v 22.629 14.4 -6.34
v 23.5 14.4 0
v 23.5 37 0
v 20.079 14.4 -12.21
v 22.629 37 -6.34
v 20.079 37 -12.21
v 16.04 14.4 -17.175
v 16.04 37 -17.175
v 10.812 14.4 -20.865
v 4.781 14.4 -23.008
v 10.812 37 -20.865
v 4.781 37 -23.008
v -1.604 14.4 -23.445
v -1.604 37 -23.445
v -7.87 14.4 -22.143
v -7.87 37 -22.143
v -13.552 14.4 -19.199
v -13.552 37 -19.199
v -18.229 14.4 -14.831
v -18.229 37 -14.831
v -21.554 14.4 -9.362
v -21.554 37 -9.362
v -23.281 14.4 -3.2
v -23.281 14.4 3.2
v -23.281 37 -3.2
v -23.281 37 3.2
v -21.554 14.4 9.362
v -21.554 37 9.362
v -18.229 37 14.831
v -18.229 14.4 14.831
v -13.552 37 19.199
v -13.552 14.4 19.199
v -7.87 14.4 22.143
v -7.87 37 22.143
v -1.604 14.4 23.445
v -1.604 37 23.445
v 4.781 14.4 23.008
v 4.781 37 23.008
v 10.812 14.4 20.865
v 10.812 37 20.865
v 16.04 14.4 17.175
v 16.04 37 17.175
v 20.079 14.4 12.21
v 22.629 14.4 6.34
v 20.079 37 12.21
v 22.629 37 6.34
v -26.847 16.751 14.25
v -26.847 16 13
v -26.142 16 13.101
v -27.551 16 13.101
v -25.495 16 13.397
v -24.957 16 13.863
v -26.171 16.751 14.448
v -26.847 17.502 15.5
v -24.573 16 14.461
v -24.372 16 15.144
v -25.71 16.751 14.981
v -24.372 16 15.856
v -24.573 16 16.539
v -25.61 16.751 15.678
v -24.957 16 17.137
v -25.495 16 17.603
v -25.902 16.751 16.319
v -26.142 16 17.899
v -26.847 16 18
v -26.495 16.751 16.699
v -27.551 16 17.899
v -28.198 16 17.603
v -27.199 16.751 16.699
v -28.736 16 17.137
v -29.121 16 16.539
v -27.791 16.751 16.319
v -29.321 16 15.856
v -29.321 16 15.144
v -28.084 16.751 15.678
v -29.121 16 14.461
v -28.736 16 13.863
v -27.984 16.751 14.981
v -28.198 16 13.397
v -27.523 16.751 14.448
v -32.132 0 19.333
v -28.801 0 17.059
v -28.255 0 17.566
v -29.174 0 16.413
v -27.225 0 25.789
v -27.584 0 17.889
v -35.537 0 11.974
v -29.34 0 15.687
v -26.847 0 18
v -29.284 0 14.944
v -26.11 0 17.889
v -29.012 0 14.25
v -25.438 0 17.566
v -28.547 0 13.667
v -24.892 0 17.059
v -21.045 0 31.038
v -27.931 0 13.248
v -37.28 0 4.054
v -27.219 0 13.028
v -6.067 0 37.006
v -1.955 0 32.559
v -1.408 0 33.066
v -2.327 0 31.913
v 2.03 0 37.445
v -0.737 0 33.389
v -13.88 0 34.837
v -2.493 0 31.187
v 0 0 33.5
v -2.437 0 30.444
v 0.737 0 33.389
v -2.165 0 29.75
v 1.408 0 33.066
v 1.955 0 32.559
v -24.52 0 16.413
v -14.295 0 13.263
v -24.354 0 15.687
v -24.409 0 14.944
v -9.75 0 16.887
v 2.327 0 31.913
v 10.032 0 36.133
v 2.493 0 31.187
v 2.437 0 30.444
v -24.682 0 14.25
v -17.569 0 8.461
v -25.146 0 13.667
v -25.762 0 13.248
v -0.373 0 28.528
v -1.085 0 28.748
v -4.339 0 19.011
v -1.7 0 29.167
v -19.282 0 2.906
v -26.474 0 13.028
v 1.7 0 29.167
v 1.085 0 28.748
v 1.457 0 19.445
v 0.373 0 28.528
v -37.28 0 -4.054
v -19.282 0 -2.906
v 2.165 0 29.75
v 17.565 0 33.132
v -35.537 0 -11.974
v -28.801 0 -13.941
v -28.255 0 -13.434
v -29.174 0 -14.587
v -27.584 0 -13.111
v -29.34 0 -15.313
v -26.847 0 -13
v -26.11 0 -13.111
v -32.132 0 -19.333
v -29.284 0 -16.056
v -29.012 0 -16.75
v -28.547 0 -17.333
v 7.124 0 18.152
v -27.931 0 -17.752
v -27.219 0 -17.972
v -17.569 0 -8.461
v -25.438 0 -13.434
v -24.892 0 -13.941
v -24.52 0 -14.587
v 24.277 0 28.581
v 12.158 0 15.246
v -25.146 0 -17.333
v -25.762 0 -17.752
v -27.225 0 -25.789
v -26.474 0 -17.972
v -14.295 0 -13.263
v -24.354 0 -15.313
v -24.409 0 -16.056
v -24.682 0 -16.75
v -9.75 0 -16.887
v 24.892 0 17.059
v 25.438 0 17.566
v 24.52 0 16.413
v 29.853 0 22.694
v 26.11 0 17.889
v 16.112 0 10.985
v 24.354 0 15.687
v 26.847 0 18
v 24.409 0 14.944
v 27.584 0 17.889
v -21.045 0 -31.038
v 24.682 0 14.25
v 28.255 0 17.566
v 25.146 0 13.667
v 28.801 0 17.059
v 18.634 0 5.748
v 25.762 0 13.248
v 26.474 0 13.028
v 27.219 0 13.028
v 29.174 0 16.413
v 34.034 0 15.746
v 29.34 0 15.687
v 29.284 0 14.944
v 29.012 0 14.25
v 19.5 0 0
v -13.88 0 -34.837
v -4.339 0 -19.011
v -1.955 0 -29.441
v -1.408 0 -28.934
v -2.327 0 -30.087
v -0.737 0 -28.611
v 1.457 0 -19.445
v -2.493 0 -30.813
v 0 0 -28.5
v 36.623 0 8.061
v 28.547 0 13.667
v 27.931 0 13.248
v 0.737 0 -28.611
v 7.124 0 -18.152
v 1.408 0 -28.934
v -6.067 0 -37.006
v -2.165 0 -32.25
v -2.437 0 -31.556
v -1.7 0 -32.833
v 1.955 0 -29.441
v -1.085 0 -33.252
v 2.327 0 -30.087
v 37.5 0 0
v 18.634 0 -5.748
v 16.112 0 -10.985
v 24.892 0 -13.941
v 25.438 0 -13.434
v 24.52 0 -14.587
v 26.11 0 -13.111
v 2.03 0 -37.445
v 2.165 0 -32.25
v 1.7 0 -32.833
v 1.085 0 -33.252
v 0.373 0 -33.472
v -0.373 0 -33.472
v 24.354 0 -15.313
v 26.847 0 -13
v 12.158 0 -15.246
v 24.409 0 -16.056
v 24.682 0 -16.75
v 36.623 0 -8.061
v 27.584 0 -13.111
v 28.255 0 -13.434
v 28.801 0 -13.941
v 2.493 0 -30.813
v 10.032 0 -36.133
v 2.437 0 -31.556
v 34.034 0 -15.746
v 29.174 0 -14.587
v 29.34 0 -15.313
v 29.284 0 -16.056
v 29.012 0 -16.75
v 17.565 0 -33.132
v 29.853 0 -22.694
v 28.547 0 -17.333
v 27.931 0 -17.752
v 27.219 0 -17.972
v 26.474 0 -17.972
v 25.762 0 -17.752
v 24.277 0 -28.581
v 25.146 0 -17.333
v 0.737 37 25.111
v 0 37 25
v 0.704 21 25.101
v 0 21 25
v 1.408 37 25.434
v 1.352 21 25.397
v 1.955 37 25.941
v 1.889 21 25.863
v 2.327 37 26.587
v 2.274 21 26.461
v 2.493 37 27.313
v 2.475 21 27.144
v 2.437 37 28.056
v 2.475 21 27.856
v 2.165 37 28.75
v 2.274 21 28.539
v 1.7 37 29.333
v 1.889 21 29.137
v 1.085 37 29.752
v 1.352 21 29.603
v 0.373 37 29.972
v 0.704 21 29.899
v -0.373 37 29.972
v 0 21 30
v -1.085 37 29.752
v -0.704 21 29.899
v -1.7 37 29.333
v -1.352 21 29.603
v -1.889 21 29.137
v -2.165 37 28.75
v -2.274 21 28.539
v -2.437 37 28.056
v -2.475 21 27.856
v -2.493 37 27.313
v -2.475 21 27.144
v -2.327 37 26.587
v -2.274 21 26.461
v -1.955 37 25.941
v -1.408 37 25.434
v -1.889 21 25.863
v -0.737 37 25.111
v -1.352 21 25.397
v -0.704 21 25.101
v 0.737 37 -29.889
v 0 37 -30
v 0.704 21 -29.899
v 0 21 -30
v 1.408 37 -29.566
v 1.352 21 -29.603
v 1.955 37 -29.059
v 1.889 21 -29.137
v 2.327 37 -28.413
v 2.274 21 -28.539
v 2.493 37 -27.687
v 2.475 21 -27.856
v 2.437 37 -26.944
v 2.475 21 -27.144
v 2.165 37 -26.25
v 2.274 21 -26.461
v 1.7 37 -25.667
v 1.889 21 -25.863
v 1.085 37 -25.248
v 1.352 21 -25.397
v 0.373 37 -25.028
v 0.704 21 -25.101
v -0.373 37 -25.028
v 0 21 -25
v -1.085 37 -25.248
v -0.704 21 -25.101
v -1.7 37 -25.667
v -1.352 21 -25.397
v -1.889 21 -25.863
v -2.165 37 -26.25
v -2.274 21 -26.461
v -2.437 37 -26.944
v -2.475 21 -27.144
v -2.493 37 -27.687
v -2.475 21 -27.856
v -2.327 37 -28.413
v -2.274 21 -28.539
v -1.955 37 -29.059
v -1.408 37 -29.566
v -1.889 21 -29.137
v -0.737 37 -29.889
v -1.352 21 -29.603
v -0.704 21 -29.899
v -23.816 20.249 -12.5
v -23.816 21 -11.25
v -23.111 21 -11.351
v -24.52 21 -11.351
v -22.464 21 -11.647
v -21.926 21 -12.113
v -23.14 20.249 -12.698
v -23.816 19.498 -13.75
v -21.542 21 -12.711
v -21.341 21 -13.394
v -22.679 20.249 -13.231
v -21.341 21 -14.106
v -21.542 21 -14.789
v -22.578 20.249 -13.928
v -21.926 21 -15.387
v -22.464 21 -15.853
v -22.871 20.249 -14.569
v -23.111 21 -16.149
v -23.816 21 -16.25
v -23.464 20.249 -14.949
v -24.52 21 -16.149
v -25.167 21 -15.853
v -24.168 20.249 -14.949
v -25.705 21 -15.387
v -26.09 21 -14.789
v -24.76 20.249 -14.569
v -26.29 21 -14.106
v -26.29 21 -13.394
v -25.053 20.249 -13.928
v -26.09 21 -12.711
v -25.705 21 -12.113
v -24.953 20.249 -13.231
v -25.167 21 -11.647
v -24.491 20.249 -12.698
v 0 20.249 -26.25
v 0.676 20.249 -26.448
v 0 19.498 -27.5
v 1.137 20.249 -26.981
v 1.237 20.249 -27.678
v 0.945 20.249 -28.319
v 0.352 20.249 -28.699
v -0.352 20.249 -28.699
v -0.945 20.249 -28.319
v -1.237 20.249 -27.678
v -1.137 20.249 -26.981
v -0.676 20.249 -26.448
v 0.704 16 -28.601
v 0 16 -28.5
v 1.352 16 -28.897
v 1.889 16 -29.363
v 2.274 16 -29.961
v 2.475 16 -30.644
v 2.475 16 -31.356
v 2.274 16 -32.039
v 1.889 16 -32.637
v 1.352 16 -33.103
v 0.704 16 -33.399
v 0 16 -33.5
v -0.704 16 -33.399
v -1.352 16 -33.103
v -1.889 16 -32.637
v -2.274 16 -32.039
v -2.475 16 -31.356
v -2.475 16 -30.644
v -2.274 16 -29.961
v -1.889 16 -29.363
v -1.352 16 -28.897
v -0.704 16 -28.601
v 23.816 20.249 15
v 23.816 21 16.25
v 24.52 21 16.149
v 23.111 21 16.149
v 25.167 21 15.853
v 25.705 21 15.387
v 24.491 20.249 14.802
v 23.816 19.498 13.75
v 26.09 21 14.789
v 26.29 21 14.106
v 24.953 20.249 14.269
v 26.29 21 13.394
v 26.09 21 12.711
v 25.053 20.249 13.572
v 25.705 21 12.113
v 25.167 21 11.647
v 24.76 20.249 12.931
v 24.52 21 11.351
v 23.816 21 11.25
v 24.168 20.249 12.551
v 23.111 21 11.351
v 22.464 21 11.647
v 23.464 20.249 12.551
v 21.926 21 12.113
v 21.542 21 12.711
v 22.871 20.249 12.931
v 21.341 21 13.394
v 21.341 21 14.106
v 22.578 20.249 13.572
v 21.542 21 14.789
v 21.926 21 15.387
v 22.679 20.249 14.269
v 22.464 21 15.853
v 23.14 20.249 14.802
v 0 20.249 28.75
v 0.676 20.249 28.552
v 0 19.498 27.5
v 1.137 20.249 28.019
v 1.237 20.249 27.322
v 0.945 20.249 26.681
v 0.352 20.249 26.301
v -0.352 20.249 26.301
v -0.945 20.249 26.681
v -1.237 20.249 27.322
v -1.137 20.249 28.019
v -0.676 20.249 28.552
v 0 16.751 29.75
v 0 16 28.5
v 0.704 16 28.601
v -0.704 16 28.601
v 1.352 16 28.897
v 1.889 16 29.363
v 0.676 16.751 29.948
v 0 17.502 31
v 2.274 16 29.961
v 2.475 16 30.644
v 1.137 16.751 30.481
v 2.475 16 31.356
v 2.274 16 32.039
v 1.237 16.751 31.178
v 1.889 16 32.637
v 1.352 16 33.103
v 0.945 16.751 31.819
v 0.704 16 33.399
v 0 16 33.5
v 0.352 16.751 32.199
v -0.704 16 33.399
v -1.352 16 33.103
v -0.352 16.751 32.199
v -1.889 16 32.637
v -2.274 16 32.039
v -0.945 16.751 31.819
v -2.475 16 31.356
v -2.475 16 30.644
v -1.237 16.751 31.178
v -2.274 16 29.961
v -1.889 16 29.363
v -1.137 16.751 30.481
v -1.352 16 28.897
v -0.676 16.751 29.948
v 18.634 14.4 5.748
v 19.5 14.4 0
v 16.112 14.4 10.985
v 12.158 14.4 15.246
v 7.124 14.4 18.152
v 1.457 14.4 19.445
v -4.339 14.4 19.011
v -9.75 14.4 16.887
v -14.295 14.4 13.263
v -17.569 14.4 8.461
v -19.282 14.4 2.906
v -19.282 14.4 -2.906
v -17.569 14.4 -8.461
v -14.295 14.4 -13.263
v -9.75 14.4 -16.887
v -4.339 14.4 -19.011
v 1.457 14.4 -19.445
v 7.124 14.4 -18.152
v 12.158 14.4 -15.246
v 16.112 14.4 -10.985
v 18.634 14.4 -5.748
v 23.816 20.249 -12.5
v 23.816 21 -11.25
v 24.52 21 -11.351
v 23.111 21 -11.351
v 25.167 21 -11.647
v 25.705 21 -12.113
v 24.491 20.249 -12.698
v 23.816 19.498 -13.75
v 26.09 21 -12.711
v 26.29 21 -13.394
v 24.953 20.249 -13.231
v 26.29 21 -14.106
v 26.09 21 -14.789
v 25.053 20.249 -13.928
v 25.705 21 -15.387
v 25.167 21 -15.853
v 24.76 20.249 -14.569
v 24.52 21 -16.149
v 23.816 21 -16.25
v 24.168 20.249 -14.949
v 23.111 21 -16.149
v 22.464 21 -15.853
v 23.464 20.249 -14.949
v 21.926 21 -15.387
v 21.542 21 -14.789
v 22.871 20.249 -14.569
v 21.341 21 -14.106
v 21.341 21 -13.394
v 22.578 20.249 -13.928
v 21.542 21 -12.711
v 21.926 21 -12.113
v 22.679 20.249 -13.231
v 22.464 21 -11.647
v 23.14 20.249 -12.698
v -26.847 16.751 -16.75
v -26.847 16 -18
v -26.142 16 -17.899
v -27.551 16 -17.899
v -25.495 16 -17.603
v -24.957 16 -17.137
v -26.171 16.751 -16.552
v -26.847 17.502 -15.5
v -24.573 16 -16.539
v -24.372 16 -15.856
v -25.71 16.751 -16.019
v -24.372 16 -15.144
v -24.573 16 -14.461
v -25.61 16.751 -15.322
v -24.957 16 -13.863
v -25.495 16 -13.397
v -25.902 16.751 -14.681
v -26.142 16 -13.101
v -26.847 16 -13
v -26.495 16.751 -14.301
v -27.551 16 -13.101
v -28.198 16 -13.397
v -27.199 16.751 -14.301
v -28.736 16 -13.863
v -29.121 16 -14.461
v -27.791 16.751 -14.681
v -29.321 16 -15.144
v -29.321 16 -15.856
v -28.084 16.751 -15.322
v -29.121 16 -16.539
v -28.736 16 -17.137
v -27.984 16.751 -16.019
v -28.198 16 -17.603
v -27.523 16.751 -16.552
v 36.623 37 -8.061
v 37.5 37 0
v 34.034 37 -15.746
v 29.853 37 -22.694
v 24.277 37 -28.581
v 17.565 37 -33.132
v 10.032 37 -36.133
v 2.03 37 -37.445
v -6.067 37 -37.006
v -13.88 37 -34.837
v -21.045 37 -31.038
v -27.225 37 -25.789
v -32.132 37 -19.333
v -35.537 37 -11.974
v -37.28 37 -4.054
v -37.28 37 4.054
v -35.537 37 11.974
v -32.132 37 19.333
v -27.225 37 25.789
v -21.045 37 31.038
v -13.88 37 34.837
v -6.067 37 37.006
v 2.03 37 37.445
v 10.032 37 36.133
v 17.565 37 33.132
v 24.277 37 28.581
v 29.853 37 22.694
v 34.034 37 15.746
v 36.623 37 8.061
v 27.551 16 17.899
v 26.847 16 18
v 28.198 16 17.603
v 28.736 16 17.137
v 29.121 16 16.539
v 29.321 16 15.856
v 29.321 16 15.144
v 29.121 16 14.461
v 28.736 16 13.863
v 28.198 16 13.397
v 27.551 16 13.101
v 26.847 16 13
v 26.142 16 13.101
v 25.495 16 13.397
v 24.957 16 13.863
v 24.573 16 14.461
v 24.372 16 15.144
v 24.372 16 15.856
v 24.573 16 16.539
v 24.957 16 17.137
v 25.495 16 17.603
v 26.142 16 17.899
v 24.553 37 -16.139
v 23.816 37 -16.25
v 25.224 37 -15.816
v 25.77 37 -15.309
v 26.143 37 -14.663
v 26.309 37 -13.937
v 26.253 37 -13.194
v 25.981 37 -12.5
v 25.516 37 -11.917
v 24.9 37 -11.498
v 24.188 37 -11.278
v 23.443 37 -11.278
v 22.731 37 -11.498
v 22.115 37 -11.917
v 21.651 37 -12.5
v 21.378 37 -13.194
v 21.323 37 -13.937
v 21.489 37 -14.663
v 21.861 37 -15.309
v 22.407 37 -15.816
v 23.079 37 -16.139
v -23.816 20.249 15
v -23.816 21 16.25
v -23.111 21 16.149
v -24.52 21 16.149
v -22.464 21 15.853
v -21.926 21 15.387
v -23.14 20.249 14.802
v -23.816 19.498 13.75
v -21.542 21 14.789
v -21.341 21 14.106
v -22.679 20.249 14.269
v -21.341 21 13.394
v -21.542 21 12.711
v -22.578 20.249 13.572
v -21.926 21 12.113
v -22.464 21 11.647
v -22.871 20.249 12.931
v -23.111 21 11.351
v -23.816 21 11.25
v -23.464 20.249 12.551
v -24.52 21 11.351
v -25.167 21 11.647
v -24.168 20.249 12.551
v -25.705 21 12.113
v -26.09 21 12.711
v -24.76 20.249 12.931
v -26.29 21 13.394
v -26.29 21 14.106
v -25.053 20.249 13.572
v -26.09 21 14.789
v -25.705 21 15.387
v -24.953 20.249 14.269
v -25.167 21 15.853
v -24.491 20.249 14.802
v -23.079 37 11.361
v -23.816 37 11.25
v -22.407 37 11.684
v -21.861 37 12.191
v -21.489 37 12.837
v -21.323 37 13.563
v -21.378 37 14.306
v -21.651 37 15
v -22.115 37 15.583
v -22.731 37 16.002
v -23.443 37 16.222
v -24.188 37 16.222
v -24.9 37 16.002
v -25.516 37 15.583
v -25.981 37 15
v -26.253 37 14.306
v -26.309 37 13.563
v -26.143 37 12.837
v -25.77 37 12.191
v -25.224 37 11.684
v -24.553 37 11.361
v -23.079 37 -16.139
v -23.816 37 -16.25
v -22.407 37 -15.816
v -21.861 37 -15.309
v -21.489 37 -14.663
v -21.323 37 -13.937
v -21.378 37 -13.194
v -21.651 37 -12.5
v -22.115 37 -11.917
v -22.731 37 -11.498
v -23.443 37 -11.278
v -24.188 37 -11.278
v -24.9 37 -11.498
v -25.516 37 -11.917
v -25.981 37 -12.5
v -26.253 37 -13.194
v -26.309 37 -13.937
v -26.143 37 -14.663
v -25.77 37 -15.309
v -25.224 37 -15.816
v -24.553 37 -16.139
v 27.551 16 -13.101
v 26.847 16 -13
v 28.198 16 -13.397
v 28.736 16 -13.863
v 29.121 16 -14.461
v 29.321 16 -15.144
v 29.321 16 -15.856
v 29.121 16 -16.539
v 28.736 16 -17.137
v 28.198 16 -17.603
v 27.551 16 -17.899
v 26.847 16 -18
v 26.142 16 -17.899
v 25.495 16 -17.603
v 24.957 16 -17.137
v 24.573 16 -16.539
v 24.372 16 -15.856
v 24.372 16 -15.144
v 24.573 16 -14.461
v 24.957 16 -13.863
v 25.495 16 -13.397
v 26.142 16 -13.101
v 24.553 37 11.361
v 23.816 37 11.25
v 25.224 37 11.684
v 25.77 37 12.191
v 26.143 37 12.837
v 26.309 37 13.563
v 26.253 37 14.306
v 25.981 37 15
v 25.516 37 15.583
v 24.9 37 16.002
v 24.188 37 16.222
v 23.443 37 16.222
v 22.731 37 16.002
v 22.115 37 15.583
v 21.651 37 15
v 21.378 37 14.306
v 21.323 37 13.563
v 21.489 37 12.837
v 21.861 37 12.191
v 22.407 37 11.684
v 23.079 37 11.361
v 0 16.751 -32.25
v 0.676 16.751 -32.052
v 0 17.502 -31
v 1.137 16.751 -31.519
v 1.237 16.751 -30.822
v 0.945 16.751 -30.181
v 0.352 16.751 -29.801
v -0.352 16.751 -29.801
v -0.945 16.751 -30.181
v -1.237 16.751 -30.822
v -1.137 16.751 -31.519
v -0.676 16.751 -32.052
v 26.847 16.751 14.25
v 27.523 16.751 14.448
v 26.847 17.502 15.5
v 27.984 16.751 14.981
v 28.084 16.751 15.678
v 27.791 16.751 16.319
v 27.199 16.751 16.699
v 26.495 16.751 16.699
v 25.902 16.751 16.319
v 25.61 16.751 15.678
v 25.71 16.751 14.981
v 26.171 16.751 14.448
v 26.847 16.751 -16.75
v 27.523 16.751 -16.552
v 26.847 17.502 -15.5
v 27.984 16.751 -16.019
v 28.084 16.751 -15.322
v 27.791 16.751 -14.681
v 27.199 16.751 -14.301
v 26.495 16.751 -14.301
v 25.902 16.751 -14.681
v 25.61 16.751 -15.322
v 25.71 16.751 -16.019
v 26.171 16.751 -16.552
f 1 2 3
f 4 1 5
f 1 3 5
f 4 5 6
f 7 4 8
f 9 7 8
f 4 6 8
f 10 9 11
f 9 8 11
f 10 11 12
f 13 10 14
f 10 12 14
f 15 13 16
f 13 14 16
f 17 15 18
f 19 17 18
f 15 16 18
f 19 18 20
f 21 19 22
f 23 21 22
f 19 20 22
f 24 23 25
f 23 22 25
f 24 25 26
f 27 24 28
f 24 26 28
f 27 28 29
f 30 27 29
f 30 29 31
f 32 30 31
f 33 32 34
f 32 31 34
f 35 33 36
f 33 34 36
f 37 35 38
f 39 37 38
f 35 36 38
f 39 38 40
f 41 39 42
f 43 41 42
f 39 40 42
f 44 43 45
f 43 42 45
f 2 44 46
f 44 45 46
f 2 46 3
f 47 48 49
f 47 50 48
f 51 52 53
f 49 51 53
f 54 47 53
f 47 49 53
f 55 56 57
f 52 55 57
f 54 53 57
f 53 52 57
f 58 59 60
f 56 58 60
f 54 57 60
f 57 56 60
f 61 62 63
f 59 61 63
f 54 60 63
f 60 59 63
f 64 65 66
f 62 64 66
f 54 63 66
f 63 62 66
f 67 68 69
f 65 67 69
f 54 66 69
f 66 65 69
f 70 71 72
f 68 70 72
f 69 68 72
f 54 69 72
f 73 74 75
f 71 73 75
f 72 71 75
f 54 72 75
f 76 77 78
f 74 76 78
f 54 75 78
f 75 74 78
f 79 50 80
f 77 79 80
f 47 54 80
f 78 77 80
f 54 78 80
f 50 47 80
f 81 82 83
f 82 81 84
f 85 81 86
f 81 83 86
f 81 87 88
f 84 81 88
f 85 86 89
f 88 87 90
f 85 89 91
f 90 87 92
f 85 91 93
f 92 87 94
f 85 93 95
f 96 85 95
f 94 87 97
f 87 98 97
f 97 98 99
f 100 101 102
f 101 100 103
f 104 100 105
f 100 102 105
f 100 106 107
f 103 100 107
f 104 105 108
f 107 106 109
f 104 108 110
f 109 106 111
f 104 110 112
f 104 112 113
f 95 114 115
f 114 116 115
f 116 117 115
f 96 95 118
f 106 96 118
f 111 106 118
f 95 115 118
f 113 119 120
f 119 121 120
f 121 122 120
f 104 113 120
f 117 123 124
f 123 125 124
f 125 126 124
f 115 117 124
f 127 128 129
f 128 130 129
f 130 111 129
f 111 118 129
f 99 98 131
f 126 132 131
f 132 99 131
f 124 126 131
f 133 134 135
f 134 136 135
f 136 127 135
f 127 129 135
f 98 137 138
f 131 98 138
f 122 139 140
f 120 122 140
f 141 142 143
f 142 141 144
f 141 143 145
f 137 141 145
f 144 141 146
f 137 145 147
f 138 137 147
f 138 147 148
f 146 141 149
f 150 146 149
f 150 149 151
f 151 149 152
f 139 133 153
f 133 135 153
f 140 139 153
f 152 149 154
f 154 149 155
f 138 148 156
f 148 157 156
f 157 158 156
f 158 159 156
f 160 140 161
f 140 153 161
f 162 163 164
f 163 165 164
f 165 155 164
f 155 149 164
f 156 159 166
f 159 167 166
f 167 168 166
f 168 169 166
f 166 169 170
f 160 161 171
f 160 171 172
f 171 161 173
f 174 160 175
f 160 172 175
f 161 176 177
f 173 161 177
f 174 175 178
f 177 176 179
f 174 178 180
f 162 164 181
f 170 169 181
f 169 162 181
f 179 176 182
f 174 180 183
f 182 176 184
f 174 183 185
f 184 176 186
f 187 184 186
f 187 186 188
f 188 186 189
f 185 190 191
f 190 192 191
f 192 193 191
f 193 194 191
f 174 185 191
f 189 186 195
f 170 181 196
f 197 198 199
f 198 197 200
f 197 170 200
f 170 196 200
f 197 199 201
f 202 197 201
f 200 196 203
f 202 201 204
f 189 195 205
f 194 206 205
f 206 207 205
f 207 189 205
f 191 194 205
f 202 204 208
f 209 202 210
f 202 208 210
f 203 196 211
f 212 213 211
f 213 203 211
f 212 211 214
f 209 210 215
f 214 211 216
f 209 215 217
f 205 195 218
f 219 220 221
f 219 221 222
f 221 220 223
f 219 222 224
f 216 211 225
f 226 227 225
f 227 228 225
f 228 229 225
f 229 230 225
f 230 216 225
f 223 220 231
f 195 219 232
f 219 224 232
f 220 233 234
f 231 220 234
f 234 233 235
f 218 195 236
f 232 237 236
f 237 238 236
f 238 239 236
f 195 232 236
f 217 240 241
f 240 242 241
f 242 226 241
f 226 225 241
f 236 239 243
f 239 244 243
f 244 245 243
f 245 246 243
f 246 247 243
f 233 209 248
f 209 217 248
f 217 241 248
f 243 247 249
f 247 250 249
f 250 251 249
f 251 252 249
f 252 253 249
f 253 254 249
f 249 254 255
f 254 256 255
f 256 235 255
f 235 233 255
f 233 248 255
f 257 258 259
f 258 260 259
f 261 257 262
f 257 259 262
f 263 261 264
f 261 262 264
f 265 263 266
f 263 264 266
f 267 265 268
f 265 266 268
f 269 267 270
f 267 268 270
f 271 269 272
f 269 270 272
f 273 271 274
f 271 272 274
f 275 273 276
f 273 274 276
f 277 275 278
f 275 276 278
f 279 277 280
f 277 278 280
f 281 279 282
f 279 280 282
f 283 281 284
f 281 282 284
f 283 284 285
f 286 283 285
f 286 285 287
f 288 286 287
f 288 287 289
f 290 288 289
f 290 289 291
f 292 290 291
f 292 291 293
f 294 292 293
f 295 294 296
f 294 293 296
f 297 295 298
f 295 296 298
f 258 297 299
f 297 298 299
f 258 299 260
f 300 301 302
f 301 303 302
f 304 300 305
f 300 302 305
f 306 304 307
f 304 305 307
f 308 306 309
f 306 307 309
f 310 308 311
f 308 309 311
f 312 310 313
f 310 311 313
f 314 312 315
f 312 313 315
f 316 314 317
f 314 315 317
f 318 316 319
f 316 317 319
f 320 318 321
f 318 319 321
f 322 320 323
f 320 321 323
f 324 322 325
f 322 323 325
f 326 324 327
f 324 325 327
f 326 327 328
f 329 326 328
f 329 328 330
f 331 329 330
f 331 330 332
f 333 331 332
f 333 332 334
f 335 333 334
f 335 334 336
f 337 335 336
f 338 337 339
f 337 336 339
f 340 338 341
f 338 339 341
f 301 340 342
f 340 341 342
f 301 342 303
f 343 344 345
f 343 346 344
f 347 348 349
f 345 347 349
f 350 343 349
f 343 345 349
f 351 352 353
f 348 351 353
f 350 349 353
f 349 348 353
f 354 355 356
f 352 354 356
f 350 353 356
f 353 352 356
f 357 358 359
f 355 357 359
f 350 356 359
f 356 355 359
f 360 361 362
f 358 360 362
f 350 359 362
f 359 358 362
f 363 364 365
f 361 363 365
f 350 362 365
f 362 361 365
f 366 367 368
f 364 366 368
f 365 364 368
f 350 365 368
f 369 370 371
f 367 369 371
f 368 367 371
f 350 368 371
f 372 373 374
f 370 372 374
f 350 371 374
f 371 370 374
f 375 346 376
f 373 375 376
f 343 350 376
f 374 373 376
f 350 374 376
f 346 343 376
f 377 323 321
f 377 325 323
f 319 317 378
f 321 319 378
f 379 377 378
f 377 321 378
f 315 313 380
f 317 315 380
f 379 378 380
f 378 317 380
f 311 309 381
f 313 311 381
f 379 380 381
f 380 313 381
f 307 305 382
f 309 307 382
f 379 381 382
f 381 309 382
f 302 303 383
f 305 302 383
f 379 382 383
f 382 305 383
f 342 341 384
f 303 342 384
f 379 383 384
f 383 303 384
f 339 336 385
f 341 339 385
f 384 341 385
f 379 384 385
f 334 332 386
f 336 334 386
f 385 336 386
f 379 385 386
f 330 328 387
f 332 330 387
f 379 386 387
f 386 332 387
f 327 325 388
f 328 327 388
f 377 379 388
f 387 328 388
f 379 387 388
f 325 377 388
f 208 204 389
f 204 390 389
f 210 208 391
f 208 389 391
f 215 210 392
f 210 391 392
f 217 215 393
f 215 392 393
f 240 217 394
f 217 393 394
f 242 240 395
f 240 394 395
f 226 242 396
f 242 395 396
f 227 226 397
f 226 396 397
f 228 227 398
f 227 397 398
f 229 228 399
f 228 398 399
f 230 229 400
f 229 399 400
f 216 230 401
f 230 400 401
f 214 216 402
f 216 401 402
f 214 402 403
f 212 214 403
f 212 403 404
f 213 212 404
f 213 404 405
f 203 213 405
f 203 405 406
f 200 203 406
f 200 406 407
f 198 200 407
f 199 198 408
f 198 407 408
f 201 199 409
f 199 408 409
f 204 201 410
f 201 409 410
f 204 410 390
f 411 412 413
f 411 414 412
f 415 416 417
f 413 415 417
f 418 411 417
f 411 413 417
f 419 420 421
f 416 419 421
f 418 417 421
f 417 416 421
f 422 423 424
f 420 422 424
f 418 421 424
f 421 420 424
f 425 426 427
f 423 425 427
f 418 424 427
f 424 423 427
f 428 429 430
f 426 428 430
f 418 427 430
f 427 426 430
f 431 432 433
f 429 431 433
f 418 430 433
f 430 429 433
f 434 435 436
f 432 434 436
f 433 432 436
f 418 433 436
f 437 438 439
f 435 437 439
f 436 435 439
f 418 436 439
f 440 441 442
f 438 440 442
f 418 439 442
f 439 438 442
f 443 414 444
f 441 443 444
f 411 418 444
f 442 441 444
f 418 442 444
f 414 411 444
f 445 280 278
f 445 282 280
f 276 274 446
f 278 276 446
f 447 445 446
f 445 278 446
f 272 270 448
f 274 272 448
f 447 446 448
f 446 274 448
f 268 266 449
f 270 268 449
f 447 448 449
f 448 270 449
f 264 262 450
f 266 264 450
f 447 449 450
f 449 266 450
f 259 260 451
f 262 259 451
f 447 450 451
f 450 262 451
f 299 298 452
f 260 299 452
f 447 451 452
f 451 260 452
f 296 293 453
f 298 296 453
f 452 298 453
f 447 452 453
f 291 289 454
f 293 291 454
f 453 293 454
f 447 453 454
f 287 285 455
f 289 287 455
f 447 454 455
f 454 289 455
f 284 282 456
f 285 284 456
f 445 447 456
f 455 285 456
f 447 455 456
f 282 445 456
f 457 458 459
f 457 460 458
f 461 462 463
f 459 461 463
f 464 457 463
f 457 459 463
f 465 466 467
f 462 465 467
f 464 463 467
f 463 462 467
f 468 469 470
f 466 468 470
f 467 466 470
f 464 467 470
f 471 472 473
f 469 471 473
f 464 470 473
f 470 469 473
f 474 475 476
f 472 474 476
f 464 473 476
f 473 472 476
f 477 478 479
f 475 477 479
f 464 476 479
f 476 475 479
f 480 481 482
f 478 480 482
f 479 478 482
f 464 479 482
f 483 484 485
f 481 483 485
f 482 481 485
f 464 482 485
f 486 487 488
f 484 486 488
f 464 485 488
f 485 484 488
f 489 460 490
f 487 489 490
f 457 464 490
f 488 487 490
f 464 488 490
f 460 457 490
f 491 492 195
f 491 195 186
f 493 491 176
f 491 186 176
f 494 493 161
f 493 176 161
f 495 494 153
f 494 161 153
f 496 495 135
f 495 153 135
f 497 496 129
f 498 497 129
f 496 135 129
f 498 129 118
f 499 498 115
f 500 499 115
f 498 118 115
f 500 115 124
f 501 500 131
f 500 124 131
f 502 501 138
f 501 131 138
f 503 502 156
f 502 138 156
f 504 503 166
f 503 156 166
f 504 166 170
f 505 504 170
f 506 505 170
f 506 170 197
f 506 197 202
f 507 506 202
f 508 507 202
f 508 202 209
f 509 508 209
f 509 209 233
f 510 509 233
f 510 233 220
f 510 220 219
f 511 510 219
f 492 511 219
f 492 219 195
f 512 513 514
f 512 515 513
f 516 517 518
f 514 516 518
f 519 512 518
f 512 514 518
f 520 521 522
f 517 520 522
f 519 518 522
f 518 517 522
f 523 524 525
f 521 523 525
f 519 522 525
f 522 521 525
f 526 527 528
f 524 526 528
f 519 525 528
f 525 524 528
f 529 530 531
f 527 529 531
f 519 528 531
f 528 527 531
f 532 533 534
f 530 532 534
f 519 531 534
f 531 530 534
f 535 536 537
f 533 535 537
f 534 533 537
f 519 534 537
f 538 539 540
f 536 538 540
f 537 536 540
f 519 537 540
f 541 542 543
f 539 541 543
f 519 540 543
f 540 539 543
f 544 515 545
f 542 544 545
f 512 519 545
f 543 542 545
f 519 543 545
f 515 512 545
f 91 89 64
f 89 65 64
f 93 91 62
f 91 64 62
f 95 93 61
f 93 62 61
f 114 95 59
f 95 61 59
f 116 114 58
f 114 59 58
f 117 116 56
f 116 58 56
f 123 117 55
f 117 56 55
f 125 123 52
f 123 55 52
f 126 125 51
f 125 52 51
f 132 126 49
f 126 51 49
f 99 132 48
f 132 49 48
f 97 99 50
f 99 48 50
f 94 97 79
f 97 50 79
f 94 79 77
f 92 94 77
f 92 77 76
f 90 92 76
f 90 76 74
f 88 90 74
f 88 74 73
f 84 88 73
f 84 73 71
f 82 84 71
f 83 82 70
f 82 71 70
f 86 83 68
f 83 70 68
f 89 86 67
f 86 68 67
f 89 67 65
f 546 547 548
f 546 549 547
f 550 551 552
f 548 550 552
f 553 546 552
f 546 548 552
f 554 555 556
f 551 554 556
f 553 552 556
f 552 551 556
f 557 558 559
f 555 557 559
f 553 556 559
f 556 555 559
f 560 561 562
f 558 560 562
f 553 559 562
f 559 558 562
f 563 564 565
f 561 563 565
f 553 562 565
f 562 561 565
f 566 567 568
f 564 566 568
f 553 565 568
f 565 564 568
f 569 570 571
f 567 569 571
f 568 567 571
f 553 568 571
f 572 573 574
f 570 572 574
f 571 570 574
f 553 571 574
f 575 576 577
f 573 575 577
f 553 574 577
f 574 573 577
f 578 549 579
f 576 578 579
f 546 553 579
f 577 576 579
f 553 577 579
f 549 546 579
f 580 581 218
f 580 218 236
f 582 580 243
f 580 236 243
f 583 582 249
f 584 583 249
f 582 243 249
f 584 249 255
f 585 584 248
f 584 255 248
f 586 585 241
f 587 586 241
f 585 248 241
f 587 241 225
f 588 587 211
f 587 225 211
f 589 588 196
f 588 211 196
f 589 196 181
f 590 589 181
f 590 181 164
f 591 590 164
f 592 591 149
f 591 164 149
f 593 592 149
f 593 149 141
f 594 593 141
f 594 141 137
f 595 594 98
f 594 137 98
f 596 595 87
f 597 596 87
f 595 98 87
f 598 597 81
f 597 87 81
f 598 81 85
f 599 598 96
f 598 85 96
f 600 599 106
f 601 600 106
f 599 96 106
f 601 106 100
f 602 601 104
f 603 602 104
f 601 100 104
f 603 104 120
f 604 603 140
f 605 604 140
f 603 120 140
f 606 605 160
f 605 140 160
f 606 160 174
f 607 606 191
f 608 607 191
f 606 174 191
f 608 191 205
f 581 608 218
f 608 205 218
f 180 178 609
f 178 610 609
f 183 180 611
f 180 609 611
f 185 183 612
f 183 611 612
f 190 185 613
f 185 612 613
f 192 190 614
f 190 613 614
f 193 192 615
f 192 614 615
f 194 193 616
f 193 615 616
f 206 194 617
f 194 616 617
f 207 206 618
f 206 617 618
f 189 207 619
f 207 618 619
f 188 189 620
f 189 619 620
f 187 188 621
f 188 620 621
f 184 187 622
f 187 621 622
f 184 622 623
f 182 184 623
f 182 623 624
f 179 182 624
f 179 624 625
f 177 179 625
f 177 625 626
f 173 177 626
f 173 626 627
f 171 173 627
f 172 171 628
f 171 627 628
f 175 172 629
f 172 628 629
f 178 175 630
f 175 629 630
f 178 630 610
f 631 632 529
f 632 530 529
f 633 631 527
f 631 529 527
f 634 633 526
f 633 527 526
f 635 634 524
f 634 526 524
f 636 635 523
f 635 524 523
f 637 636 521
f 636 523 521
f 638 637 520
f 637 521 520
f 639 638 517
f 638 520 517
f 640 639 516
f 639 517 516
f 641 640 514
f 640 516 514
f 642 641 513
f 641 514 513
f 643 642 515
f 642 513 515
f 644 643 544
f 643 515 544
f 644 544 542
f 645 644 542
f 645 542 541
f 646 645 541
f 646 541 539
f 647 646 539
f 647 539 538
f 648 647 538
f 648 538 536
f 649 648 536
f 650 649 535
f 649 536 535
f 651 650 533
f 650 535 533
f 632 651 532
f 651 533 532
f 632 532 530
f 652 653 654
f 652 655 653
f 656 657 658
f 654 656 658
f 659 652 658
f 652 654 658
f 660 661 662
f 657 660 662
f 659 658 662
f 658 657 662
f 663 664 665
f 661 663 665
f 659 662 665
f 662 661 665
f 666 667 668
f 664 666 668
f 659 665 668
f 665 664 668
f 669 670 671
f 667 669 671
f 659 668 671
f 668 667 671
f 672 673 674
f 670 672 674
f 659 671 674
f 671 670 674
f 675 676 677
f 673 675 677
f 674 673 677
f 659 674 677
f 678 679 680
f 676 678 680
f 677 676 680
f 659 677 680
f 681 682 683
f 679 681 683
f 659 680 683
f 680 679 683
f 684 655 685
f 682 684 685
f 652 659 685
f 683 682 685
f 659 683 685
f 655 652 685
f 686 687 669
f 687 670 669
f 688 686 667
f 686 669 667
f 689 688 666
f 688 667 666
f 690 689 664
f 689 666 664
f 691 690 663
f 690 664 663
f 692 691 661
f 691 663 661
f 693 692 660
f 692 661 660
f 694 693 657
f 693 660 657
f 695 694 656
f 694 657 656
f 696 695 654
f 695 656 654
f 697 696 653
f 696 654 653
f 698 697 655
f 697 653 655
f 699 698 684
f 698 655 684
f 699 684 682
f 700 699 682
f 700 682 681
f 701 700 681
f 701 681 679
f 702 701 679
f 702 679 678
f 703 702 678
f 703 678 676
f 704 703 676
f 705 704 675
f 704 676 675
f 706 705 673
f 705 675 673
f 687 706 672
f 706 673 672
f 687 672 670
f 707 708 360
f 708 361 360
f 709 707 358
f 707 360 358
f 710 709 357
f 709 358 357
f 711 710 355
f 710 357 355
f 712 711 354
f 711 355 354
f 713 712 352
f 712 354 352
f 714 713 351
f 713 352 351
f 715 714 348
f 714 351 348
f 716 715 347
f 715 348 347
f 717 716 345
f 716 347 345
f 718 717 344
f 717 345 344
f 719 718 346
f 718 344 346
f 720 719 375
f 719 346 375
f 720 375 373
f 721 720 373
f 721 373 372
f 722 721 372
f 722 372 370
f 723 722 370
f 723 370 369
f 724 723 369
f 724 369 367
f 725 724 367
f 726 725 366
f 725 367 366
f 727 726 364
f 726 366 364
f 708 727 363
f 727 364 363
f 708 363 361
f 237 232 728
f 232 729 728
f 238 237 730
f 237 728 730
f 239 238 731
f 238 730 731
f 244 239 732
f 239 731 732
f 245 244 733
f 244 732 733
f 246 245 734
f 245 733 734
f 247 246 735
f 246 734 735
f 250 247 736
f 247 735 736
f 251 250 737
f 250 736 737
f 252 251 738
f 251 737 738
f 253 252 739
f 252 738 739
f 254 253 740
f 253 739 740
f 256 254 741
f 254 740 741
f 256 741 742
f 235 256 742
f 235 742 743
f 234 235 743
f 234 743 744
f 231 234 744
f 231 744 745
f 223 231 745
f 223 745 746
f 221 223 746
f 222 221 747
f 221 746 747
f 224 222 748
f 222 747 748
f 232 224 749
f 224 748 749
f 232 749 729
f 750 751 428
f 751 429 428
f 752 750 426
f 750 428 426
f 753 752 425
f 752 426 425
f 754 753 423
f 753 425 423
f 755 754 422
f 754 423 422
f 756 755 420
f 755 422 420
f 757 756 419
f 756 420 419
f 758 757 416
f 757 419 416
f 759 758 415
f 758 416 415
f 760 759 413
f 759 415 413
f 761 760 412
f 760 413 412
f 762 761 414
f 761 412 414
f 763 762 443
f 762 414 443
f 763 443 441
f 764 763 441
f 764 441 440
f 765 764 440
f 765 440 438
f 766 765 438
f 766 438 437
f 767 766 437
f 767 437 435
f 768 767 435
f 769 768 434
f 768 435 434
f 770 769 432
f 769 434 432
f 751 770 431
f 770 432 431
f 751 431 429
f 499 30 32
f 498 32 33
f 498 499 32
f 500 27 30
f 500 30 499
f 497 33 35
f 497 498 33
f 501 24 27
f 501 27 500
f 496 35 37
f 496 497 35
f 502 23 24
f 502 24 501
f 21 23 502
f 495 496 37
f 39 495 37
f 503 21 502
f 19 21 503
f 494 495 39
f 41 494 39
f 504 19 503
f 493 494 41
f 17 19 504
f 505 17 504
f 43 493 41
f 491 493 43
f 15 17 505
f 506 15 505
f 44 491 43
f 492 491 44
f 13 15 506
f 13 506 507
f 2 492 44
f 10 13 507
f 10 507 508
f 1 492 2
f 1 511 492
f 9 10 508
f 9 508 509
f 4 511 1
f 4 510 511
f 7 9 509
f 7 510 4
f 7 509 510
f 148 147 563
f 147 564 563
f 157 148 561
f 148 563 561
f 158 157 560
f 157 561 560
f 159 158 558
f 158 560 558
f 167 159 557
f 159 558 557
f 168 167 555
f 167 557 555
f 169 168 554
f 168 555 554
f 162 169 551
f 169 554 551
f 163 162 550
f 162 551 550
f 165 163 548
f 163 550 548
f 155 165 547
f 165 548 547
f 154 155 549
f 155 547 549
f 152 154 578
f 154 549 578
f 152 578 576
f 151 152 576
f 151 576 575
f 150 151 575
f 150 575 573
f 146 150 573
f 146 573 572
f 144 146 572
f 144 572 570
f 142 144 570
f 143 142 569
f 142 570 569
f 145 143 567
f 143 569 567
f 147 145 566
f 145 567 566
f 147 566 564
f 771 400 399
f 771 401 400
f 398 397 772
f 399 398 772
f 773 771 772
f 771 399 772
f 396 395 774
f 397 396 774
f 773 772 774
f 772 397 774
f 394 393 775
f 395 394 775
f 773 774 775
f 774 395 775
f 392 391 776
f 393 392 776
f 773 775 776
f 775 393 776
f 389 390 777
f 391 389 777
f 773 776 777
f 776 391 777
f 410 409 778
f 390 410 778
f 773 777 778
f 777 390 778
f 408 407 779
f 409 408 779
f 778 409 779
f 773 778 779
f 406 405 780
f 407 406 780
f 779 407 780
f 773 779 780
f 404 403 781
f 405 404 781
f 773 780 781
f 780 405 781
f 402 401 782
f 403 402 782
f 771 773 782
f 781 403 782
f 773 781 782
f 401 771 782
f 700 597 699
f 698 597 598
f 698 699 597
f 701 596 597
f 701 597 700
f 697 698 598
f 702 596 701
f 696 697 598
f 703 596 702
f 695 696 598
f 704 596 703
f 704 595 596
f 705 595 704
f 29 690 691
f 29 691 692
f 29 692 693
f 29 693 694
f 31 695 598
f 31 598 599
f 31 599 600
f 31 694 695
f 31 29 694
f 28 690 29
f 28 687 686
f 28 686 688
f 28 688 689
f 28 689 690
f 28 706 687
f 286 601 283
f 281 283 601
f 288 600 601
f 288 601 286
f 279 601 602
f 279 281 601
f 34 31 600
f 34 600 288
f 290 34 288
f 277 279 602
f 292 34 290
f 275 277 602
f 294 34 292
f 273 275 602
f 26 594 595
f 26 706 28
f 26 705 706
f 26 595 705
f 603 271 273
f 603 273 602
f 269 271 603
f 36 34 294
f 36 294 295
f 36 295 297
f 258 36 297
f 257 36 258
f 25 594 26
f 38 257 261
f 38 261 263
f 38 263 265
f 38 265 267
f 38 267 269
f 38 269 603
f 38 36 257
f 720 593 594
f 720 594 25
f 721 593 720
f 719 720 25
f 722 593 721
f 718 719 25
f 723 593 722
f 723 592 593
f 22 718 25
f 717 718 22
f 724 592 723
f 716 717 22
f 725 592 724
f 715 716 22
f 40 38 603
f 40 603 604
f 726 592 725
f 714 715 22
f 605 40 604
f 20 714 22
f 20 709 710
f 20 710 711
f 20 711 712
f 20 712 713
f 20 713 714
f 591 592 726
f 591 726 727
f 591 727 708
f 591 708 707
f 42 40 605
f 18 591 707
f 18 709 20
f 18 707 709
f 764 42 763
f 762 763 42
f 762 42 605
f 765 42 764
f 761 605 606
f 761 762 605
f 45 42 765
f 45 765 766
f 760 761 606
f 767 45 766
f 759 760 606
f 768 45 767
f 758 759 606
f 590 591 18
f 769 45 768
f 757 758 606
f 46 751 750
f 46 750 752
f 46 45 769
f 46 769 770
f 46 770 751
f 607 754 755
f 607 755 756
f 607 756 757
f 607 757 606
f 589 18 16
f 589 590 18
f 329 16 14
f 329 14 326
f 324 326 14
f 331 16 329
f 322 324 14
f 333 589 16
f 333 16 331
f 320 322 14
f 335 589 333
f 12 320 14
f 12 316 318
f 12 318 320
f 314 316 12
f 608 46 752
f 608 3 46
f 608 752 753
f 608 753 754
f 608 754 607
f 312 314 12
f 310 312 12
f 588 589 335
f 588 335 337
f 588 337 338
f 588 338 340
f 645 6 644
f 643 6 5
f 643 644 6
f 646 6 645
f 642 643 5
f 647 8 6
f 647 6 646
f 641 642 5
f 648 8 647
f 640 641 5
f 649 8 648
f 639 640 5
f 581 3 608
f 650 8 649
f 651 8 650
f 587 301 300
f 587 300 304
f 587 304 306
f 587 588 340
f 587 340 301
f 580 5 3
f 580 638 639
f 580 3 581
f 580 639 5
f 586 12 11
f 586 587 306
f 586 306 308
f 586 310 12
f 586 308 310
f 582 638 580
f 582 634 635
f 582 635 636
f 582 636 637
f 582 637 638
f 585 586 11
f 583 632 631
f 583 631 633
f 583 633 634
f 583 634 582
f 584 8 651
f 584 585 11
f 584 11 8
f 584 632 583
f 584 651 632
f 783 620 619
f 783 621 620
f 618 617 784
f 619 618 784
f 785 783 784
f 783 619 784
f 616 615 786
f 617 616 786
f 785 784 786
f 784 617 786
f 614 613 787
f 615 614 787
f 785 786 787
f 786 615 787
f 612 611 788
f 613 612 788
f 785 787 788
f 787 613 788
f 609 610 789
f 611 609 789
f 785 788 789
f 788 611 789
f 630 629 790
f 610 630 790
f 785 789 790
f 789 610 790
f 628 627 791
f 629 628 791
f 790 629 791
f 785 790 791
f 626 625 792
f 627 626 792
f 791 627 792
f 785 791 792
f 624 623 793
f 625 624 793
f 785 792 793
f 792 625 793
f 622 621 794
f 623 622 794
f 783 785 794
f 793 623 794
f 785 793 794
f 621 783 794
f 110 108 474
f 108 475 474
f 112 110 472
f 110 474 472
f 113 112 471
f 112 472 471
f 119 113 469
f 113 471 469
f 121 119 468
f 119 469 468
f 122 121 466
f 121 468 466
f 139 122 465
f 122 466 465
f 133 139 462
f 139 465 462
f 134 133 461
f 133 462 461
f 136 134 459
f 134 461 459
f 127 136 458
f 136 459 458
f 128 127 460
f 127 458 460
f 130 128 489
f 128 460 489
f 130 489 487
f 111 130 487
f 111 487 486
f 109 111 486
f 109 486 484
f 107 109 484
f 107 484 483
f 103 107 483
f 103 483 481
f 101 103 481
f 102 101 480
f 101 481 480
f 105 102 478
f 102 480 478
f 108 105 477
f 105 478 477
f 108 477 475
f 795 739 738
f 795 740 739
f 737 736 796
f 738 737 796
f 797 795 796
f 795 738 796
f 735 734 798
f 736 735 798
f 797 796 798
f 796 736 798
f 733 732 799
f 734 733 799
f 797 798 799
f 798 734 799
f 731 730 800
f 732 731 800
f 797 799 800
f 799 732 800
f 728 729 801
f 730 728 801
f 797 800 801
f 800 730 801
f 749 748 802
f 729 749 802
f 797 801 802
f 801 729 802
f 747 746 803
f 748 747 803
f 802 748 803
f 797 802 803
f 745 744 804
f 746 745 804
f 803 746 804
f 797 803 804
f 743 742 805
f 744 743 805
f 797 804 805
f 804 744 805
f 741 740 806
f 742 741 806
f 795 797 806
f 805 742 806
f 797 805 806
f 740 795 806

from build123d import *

# Parameters (mm, degrees)
SKETCH1_R                       = 37.5
BOSS_EXTRUDE1_DEPTH             = 37
SKETCH2_R                       = 23.5
CUT_EXTRUDE1_DEPTH              = 22.6
SKETCH3_R                       = 19.5
CUT_EXTRUDE2_DEPTH              = 38
M6X1_0_TAPPED_HOLE1_D           = 5
M6X1_0_TAPPED_HOLE1_DEPTH       = 16
M6X1_0_TAPPED_HOLE1_TIP         = 1.502151548
TAP_DRILL_FOR_M6X1_0_TAP1_D     = 5
TAP_DRILL_FOR_M6X1_0_TAP1_DEPTH = 16
TAP_DRILL_FOR_M6X1_0_TAP1_TIP   = 1.502151548


with BuildPart() as part:
    # Sketch1 → Boss-Extrude1 (new body)
    with BuildSketch(Plane(origin=(0, 0, 0), x_dir=(1, 0, 0), z_dir=(0, 1, 0))):
        Circle(SKETCH1_R)
    extrude(amount=BOSS_EXTRUDE1_DEPTH)

    # Sketch2 → Cut-Extrude1 (cut)
    with BuildSketch(Plane(origin=(0, 37, 0), x_dir=(1, 0, 0), z_dir=(0, 1, 0))):
        Circle(SKETCH2_R)
    extrude(amount=-CUT_EXTRUDE1_DEPTH, mode=Mode.SUBTRACT)

    # Sketch3 → Cut-Extrude2 (cut, through all)
    with BuildSketch(Plane.XZ):
        Circle(SKETCH3_R)
    extrude(amount=-CUT_EXTRUDE2_DEPTH, mode=Mode.SUBTRACT)

    # M6x1.0 Tapped Hole1
    with Locations(Plane(origin=(0, 0, 31), x_dir=(0, 0, -1), z_dir=(0, -1, 0))):
        with Locations((0, 0), (15.5, 26.846787517), (46.5, 26.846787517), (62, 0), (46.5, -26.846787517), (15.5, -26.846787517)):
            Hole(M6X1_0_TAPPED_HOLE1_D / 2, depth=M6X1_0_TAPPED_HOLE1_DEPTH)
            with Locations((0, 0, -(M6X1_0_TAPPED_HOLE1_DEPTH + M6X1_0_TAPPED_HOLE1_TIP / 2))):  # 118° drill point
                Cone(0, M6X1_0_TAPPED_HOLE1_D / 2, M6X1_0_TAPPED_HOLE1_TIP, mode=Mode.SUBTRACT)

    # Tap Drill for M6x1.0 Tap1
    with Locations(Plane(origin=(0, 37, -27.5), x_dir=(0, 0, 1), z_dir=(0, 1, 0))):
        with Locations((0, 0), (13.75, 23.815698604), (41.25, 23.815698604), (55, 0), (41.25, -23.815698604), (13.75, -23.815698604)):
            Hole(TAP_DRILL_FOR_M6X1_0_TAP1_D / 2, depth=TAP_DRILL_FOR_M6X1_0_TAP1_DEPTH)
            with Locations((0, 0, -(TAP_DRILL_FOR_M6X1_0_TAP1_DEPTH + TAP_DRILL_FOR_M6X1_0_TAP1_TIP / 2))):  # 118° drill point
                Cone(0, TAP_DRILL_FOR_M6X1_0_TAP1_D / 2, TAP_DRILL_FOR_M6X1_0_TAP1_TIP, mode=Mode.SUBTRACT)


solid = part.part
